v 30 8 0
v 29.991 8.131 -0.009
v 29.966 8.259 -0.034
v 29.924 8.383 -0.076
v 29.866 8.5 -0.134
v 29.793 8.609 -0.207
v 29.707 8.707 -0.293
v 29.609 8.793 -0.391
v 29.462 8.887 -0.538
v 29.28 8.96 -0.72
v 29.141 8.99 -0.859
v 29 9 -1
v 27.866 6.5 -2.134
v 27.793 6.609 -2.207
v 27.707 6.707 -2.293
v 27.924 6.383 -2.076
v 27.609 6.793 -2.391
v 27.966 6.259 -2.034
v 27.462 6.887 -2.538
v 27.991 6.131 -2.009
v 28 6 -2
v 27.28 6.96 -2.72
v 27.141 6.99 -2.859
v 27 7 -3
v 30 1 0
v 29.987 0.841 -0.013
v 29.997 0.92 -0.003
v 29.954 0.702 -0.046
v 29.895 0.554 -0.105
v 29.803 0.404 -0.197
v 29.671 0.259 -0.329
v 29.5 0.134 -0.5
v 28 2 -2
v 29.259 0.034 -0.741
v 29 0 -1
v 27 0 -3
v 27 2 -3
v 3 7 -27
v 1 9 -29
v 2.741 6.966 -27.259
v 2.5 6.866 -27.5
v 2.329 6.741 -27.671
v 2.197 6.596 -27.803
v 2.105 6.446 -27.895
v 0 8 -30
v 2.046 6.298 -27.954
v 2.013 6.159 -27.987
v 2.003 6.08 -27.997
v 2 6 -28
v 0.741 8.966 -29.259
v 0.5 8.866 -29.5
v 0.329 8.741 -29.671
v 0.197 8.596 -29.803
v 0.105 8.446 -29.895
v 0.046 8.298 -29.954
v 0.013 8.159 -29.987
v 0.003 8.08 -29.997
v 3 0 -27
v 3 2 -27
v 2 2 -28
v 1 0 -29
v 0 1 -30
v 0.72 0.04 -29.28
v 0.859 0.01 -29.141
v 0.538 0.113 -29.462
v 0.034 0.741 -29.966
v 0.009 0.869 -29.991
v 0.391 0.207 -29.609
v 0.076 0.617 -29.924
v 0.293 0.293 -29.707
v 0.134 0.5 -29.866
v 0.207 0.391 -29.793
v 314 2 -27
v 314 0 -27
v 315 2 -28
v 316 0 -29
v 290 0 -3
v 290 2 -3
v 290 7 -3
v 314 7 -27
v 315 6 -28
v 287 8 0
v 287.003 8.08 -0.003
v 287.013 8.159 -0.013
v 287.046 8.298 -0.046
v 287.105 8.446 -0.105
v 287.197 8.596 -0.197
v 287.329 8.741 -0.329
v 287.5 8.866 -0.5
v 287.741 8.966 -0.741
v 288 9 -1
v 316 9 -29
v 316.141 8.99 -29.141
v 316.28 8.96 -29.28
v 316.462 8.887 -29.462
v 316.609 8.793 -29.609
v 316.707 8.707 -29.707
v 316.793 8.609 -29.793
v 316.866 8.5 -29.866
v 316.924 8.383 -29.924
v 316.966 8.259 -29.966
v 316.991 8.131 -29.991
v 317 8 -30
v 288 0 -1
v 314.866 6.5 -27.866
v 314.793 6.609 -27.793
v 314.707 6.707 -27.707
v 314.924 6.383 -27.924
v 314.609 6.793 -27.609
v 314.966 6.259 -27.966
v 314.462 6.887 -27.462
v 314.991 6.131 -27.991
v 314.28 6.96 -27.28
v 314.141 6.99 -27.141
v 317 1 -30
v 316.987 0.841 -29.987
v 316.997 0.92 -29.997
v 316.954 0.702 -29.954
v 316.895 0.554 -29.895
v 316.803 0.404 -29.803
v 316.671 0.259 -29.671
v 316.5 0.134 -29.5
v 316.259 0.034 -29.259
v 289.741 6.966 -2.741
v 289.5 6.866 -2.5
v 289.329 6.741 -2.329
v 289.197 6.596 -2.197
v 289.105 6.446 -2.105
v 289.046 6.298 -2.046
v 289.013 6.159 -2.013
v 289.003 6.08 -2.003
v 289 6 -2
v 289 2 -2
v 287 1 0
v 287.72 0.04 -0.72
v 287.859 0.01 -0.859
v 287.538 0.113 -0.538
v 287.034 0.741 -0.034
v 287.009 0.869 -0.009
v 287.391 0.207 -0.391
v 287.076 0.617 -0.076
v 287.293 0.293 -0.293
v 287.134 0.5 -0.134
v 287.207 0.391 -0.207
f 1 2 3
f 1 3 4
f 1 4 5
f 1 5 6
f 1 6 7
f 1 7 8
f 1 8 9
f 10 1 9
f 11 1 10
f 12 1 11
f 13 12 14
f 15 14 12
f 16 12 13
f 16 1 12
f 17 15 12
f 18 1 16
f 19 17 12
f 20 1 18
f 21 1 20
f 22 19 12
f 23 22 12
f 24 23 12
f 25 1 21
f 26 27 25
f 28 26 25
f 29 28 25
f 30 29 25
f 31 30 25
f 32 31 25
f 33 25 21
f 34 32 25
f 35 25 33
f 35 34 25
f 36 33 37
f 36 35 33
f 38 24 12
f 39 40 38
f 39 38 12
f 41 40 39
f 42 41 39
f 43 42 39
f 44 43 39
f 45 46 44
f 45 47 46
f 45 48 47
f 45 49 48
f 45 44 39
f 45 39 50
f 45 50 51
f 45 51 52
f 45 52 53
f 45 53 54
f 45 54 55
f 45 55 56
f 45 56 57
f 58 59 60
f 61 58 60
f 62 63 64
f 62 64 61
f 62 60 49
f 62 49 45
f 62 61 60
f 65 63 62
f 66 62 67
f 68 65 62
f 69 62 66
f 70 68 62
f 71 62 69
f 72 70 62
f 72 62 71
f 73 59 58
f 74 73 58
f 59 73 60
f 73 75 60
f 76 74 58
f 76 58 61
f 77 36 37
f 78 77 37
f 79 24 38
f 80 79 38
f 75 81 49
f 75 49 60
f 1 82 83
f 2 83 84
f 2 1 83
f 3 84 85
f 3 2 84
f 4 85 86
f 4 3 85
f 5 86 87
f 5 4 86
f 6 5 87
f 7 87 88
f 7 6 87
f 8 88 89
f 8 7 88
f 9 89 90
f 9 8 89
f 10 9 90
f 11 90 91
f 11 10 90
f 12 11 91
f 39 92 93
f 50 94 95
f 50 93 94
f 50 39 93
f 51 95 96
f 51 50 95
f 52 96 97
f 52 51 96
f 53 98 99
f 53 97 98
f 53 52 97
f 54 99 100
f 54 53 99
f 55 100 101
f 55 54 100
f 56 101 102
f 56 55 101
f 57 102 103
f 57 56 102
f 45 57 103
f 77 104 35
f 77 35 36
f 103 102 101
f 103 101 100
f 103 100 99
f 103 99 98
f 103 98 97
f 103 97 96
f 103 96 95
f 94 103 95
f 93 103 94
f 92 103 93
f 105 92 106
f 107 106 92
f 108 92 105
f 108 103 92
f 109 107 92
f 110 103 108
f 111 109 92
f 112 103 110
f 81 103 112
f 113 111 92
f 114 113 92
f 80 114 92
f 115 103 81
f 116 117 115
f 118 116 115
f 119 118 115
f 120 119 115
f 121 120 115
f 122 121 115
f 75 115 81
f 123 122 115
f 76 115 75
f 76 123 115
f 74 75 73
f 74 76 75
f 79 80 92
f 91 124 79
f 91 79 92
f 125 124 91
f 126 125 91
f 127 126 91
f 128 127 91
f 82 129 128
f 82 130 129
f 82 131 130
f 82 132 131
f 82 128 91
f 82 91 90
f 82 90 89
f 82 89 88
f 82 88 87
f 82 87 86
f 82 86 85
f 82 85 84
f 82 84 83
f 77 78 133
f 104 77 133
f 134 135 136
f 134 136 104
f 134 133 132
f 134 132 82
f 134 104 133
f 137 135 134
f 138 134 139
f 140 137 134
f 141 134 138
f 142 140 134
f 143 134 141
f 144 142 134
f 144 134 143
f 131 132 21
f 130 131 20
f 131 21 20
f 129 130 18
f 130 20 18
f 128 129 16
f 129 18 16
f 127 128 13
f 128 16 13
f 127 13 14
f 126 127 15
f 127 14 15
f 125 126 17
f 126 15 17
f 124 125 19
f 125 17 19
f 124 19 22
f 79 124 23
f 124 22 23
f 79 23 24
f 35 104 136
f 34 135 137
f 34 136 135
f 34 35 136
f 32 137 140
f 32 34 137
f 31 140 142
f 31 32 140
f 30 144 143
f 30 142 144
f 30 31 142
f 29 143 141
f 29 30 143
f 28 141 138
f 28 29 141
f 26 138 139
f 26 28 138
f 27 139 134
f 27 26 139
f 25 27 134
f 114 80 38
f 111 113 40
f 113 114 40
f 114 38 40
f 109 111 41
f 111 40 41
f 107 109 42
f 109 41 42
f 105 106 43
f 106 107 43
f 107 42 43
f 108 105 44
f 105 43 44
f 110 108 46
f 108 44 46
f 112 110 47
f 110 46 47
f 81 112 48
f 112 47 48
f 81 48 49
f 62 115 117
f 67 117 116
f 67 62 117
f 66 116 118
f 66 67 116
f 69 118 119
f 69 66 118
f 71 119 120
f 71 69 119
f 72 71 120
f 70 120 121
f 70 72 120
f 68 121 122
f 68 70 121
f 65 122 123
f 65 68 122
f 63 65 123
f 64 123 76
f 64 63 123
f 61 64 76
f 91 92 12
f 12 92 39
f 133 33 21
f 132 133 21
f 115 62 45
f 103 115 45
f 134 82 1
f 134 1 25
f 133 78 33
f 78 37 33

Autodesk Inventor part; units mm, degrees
ref_plane "YZ Plane" through (0, 0, 0) normal (1, 0, 0) x (0, 1, 0)
ref_plane "XZ Plane" through (0, 0, 0) normal (0, 1, 0) x (-1, 0, 0)
ref_plane "XY Plane" through (0, 0, 0) normal (0, 0, 1) x (1, 0, 0)
sketch "Boceto principal" plane through (0, 0, 0) normal (1, 0, 0) x (0, 1, 0)
  line L0 (0, -1) -> (0, -3)
  line L1 (0, -3) -> (2, -3)
  line L2 (2, -3) -> (2, -2)
  line L3 (2, -2) -> (6, -2)
  line L4 (7, -3) -> (7, -27)
  line L5 (6, -28) -> (2, -28)
  line L6 (2, -28) -> (2, -27)
  line L7 (2, -27) -> (0, -27)
  line L8 (0, -27) -> (0, -29)
  line L9 (1, -30) -> (8, -30)
  line L10 (9, -29) -> (9, -1)
  line L11 (8, 0) -> (1, 0)
  arc A0 (1, 0) -> (0, -1) centre (1, -1) ccw
  arc A1 (7, -3) -> (6, -2) centre (6, -3) ccw
  arc A2 (6, -28) -> (7, -27) centre (6, -27) ccw
  arc A3 (0, -29) -> (1, -30) centre (1, -29) ccw
  arc A4 (8, -30) -> (9, -29) centre (8, -29) ccw
  arc A5 (9, -1) -> (8, 0) centre (8, -1) ccw
extrude "Extrusion1" add sketch "Boceto principal" along normal blind 317
sketch "Boceto esquinas" plane through (0, 0, 0) normal (0, 1, 0) x (-1, 0, 0)
  line L0 (0, 0) -> (-30, 0)
  line L1 (-30, 0) -> (0, -30)
  line L2 (0, -30) -> (0, 0)
  line L3 (-287, 0) -> (-317, 0)
  line L4 (-317, 0) -> (-317, -30)
  line L5 (-317, -30) -> (-287, 0)
extrude "Extrusion2" cut sketch "Boceto esquinas" along normal blind 10
properties part number "Tapa 30x30 317mm" material "PVC, Flexible"
